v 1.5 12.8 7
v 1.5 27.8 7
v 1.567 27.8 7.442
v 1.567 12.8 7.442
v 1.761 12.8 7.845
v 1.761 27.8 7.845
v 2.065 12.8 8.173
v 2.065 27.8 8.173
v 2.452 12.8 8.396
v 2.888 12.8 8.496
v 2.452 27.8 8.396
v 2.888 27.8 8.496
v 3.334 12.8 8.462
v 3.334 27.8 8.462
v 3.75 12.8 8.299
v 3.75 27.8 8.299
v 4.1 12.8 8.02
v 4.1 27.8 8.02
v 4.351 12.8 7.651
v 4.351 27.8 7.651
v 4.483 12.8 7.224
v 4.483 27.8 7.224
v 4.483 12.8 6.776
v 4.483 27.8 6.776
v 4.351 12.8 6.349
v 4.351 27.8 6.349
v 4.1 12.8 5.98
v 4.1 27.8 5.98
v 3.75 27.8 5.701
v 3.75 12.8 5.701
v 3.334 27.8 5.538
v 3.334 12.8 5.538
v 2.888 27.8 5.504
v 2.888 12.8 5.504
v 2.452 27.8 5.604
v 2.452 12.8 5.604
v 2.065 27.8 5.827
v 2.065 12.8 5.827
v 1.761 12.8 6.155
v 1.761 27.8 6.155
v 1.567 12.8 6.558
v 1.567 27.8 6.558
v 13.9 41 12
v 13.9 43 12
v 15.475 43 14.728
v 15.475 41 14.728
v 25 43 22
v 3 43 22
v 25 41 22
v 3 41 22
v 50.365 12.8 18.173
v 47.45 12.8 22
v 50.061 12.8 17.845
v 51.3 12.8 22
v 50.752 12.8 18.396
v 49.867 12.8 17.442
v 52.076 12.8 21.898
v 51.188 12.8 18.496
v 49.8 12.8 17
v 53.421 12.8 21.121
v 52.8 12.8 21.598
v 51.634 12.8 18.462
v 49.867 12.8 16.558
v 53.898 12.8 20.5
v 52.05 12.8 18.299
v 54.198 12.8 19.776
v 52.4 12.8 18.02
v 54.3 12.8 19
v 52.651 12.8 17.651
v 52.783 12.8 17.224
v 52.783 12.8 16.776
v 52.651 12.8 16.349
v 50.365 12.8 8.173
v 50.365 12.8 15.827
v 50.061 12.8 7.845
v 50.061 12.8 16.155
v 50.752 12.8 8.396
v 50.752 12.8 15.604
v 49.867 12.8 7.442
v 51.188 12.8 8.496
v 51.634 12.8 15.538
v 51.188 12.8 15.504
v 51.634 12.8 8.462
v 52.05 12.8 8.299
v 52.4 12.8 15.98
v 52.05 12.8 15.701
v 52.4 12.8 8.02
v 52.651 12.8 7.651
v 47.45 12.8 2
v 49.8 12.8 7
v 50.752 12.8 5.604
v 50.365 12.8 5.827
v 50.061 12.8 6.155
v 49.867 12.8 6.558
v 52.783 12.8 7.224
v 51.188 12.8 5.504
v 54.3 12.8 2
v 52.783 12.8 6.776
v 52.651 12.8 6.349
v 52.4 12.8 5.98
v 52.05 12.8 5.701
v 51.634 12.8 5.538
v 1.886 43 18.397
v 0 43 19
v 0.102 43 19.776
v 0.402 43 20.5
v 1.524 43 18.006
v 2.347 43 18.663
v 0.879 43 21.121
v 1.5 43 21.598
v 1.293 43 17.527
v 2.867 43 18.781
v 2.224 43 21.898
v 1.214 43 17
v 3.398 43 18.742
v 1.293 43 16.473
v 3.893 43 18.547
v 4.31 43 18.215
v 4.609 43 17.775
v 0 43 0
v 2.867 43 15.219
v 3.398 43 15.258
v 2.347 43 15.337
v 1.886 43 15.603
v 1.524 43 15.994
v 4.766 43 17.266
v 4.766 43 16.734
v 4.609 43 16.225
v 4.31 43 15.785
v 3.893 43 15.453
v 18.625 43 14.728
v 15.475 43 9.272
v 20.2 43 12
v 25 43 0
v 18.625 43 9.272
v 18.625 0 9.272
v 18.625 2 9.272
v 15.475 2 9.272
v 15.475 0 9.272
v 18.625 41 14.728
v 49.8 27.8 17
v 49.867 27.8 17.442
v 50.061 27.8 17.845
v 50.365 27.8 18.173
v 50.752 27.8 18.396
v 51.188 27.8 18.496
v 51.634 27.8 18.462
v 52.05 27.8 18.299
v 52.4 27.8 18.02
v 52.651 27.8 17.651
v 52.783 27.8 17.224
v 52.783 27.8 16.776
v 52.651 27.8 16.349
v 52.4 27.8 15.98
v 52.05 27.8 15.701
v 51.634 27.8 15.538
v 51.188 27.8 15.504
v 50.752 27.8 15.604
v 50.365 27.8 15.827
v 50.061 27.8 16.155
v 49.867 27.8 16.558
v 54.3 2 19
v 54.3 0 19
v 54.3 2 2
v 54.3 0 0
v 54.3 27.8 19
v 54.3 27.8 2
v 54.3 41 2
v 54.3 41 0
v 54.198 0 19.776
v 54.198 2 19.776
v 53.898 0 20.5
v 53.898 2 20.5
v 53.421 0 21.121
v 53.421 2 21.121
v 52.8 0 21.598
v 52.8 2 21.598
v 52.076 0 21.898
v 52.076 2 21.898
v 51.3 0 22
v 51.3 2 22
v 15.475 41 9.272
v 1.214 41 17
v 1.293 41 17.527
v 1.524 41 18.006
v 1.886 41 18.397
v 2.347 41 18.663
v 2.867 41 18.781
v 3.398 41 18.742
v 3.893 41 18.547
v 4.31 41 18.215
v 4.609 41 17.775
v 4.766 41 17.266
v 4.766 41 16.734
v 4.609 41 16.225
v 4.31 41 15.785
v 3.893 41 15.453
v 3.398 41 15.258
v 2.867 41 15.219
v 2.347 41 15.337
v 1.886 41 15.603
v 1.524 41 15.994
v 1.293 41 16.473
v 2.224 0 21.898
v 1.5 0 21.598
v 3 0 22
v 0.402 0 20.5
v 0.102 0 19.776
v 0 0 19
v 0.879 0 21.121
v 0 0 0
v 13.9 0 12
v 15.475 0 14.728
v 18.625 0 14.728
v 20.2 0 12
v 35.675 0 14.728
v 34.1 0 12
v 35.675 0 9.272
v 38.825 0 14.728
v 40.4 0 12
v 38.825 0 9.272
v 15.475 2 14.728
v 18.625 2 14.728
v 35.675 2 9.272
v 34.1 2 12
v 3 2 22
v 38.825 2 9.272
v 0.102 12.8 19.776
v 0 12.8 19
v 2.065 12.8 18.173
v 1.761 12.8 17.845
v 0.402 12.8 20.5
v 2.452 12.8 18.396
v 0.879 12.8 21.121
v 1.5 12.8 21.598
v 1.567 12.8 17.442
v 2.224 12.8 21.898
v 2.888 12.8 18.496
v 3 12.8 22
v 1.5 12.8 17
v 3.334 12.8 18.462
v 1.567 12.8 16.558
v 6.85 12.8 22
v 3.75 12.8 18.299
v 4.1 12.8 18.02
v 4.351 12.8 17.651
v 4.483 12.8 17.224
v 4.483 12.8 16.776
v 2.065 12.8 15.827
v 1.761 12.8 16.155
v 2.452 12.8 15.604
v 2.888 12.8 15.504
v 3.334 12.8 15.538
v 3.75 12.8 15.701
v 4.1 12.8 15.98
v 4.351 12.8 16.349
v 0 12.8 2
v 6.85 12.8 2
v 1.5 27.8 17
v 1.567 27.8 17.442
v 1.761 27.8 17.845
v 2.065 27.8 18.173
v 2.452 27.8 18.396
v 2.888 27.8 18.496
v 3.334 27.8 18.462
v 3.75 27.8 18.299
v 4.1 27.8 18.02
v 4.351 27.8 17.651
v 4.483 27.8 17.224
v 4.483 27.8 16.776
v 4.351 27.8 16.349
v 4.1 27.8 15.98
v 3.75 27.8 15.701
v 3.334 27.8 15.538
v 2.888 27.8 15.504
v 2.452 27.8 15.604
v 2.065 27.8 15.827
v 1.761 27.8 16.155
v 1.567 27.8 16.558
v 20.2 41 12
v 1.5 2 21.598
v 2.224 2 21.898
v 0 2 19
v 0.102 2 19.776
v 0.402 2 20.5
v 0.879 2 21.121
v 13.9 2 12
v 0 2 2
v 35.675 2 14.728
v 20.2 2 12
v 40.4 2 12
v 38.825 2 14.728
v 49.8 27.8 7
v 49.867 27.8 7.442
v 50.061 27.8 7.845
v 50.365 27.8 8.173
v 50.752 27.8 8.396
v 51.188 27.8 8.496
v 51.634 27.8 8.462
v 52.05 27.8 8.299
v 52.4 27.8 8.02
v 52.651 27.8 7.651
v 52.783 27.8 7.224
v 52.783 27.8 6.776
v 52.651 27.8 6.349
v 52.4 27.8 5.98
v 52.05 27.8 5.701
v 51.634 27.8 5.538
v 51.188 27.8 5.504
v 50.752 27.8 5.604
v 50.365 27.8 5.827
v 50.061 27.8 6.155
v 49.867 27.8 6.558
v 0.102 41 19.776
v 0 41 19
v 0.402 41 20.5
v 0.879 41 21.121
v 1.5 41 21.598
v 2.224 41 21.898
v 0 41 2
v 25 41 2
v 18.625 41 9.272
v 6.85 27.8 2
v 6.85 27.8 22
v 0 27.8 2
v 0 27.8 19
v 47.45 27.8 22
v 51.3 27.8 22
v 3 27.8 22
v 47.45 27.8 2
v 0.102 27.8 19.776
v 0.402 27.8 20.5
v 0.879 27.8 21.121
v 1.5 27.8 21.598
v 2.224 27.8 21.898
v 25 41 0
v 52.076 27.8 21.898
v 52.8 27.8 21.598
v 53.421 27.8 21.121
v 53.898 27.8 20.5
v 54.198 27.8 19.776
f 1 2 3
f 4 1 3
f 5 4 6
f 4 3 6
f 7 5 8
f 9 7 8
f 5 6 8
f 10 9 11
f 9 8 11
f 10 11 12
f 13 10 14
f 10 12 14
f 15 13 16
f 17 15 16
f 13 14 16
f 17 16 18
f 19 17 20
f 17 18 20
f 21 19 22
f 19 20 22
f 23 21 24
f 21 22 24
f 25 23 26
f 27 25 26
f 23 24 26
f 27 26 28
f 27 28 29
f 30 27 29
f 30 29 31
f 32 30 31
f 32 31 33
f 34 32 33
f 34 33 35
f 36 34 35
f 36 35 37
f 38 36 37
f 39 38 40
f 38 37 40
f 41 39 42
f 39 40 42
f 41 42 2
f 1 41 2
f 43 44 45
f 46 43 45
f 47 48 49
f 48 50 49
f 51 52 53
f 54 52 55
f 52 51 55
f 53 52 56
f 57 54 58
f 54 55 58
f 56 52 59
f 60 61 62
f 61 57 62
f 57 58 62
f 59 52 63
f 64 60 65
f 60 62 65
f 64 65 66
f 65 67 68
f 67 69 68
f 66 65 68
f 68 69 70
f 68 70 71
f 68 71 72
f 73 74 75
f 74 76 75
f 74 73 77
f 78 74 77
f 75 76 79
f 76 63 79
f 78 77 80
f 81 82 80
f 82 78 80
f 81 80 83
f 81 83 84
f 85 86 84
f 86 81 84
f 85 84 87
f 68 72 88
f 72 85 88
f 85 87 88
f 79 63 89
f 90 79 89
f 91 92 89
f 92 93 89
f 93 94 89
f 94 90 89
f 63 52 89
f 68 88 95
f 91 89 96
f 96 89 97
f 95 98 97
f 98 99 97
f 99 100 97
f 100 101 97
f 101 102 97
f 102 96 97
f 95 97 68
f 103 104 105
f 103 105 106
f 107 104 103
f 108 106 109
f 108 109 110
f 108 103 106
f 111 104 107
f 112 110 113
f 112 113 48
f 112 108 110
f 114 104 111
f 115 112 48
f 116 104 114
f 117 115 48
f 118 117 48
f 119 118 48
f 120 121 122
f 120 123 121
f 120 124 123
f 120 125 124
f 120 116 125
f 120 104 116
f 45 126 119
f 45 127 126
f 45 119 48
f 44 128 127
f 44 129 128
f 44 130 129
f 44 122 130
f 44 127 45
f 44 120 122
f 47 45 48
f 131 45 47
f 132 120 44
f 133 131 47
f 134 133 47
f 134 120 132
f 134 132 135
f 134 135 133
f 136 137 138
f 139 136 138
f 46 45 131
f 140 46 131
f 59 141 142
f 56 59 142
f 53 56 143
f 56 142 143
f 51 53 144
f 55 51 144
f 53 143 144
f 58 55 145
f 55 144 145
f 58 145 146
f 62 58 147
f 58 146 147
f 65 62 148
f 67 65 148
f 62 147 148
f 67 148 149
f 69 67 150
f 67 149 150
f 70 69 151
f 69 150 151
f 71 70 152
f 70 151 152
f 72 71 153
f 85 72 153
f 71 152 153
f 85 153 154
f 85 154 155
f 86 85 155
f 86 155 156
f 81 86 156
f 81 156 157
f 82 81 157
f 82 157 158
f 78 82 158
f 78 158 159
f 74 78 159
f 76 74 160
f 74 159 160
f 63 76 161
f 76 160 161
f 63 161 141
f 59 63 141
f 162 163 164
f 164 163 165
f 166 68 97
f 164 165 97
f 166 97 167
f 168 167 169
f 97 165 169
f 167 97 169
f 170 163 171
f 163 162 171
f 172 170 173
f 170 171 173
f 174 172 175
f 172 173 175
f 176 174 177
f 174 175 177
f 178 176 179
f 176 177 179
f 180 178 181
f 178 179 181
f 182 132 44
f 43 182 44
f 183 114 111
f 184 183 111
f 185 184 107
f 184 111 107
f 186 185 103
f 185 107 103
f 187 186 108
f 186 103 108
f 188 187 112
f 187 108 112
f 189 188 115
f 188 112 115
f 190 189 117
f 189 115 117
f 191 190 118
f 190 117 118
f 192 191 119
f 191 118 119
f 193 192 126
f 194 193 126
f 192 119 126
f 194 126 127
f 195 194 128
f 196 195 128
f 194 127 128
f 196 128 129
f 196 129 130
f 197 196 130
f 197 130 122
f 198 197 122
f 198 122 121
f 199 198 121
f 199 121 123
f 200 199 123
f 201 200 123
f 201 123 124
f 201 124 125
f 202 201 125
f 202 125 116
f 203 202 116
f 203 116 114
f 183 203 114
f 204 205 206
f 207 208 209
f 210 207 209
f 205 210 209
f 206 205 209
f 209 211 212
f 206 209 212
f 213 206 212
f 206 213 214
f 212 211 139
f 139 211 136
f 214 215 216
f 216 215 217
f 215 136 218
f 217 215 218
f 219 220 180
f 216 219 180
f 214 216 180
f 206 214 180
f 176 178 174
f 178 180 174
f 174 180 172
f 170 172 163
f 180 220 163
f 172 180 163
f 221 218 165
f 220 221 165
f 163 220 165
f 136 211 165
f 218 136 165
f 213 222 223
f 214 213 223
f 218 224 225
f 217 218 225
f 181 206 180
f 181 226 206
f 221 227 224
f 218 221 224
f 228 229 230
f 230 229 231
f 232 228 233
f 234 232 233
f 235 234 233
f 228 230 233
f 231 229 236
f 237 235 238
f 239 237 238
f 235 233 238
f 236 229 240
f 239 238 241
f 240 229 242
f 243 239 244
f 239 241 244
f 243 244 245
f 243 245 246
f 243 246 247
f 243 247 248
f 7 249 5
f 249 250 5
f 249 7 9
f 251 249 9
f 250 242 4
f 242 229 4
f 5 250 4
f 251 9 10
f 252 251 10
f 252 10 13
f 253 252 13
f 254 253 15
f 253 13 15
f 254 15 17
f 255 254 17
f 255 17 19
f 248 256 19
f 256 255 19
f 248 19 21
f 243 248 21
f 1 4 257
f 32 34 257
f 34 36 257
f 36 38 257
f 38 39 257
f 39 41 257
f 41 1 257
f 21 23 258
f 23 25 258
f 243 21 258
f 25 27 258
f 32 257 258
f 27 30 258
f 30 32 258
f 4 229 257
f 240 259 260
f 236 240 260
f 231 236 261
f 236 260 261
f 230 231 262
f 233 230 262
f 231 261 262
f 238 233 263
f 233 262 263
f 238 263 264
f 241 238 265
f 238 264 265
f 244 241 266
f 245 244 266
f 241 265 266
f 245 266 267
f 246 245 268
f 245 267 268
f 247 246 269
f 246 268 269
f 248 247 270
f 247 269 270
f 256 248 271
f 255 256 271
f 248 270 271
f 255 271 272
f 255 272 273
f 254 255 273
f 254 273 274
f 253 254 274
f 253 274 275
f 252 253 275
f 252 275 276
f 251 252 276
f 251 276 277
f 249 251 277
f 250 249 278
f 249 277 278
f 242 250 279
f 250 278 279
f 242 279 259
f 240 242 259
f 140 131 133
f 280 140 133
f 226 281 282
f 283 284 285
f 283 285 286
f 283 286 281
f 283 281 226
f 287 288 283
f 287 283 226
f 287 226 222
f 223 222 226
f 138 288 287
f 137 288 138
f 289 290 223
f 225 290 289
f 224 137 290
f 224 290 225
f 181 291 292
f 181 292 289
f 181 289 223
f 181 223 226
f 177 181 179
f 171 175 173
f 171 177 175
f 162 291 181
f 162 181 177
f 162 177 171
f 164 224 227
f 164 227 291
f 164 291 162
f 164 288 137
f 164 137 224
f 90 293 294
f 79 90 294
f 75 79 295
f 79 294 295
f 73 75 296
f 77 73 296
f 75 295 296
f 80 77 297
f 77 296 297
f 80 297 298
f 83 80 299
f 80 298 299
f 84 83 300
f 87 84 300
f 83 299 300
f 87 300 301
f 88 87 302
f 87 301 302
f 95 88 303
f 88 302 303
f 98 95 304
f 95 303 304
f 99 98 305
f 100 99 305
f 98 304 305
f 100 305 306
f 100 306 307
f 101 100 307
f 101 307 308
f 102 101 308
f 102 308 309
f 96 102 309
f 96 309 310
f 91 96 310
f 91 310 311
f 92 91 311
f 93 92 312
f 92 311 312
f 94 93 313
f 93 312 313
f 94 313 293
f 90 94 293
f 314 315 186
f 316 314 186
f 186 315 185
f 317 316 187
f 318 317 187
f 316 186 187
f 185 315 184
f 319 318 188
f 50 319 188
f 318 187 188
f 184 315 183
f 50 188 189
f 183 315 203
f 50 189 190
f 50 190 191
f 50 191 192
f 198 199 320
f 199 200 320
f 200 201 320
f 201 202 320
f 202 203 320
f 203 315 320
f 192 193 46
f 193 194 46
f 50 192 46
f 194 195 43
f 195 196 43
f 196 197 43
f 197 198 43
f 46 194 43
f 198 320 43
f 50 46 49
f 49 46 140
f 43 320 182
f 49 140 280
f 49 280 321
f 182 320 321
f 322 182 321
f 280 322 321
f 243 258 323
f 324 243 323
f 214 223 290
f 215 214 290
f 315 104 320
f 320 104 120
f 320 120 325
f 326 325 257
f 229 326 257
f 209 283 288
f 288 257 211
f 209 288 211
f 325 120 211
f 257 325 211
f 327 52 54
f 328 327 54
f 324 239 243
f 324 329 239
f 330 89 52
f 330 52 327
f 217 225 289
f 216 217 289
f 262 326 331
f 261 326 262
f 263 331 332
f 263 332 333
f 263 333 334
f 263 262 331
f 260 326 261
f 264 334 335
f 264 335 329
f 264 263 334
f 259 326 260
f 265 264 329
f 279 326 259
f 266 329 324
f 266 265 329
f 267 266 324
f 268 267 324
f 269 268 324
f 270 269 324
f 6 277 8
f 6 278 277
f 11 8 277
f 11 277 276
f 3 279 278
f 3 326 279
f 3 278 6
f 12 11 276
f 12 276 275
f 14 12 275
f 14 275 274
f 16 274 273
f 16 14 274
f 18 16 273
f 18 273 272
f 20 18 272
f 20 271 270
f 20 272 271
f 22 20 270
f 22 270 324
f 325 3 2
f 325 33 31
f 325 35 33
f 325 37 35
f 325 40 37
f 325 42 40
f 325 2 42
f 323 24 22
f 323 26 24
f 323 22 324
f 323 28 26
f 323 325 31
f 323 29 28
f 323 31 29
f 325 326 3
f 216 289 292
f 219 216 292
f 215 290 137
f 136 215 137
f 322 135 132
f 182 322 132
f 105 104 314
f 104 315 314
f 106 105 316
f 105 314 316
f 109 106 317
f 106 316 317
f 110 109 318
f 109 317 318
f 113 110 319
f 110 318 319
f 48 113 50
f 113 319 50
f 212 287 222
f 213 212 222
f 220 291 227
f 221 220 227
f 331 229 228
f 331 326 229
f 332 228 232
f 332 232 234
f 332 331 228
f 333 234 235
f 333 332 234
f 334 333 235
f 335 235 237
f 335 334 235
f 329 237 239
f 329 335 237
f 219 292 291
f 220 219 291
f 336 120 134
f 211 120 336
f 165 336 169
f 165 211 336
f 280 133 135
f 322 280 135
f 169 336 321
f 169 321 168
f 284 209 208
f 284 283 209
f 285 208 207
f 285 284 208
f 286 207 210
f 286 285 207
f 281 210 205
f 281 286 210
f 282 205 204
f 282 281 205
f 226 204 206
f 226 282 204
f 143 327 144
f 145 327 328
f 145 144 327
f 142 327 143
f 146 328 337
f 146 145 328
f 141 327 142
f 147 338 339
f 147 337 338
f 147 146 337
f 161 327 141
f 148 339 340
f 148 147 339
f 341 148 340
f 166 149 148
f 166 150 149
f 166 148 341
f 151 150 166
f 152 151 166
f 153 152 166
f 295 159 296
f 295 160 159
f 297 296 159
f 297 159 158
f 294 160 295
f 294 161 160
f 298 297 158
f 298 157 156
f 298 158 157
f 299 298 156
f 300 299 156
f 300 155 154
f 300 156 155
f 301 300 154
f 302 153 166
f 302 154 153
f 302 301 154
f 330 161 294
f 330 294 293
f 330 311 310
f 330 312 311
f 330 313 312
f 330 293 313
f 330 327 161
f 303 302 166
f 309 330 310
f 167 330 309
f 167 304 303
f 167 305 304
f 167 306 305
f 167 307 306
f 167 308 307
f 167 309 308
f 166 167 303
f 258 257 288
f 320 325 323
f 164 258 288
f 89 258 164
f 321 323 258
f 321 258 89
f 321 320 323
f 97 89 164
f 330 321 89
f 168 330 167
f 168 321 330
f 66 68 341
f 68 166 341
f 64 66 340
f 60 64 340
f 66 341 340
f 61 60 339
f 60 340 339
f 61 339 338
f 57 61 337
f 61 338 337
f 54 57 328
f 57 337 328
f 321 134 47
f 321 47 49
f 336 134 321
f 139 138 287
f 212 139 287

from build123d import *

# Parameters (mm, degrees)
SKETCH_W        = 54.3
SKETCH_H        = 39
PAD_DEPTH       = 2
SKETCH001_W     = 54.3
SKETCH001_H     = 2
PAD001_DEPTH    = 22
SKETCH003_W     = 6.85
SKETCH003_H     = 15
PAD003_DEPTH    = 22
SKETCH004_R     = 1.5
POCKET_DEPTH    = 15
SKETCH005_W     = 6.85
SKETCH005_H     = 15
PAD004_DEPTH    = 22
SKETCH006_R     = 1.5
POCKET001_DEPTH = 15
SKETCH007_W     = 25
SKETCH007_H     = 2
PAD005_DEPTH    = 22
POCKET002_DEPTH = 2.5
POCKET003_DEPTH = 5
FILLET_R        = 3
FILLET001_R     = 3
FILLET002_R     = 3
FILLET003_R     = 3
FILLET004_R     = 3
SKETCH010_R     = 1.786385
POCKET004_DEPTH = 5


with BuildPart() as part:
    # Sketch → Pad (new body)
    with BuildSketch(Plane.XY):
        with Locations((27.15, 21.5)):
            Rectangle(SKETCH_W, SKETCH_H)
    extrude(amount=PAD_DEPTH)

    # Sketch001 → Pad001 (join)
    with BuildSketch(Plane.XY):
        with Locations((27.15, 1)):
            Rectangle(SKETCH001_W, SKETCH001_H)
    extrude(amount=PAD001_DEPTH)

    # Sketch003 → Pad003 (join)
    with BuildSketch(Plane.XY):
        with Locations((3.425, 20.3)):
            Rectangle(SKETCH003_W, SKETCH003_H)
    extrude(amount=PAD003_DEPTH)

    # Sketch004 (on Face14 of Pad003) → Pocket (cut)
    with BuildSketch(Plane(origin=(0, 27.8, 0), x_dir=(-1, 0, 0), z_dir=(0, 1, 0))):
        with Locations((-3, 17)):
            Circle(SKETCH004_R)
        with Locations((-3, 7)):
            Circle(SKETCH004_R)
    extrude(amount=-POCKET_DEPTH, mode=Mode.SUBTRACT)

    # Sketch005 → Pad004 (join)
    with BuildSketch(Plane.XY):
        with Locations((50.875, 20.3)):
            Rectangle(SKETCH005_W, SKETCH005_H)
    extrude(amount=PAD004_DEPTH)

    # Sketch006 (on Face13 of Pad004) → Pocket001 (cut)
    with BuildSketch(Plane(origin=(0, 27.8, 0), x_dir=(-1, 0, 0), z_dir=(0, 1, 0))):
        with Locations((-51.3, 17)):
            Circle(SKETCH006_R)
        with Locations((-51.3, 7)):
            Circle(SKETCH006_R)
    extrude(amount=-POCKET001_DEPTH, mode=Mode.SUBTRACT)

    # Sketch007 (on Face4 of Pocket001) → Pad005 (join)
    with BuildSketch(Plane(origin=(0, 0, 0), x_dir=(1, 0, 0), z_dir=(0, 0, -1))):
        with Locations((12.5, -42)):
            Rectangle(SKETCH007_W, SKETCH007_H)
    extrude(amount=-PAD005_DEPTH)

    # Sketch008 (on Face18 of Pad005) → Pocket002 (cut)
    with BuildSketch(Plane(origin=(0, 2, 0), x_dir=(-1, 0, 0), z_dir=(0, 1, 0))):
        Polygon((-34.1, 12), (-35.675, 14.72798), (-38.825, 14.72798), (-40.4, 12), (-38.825, 9.27202), (-35.675, 9.27202), align=None)
        Polygon((-15.475, 14.72798), (-18.625, 14.72798), (-20.2, 12), (-18.625, 9.27202), (-15.475, 9.27202), (-13.9, 12), align=None)
    extrude(amount=-POCKET002_DEPTH, mode=Mode.SUBTRACT)

    # Sketch009 (on Face22 of Pocket002) → Pocket003 (cut)
    with BuildSketch(Plane(origin=(0, 43, 0), x_dir=(-1, 0, 0), z_dir=(0, 1, 0))):
        Polygon((-13.9, 12), (-15.475, 14.72798), (-18.625, 14.72798), (-20.2, 12), (-18.625, 9.27202), (-15.475, 9.27202), align=None)
    extrude(amount=-POCKET003_DEPTH, mode=Mode.SUBTRACT)

    # Fillet
    fillet_edges = [part.edges().sort_by_distance(p)[0] for p in [
        (0, 42, 22),
    ]]
    fillet(fillet_edges, radius=FILLET_R)

    # Fillet001
    fillet001_edges = [part.edges().sort_by_distance(p)[0] for p in [
        (0, 1, 22),
    ]]
    fillet(fillet001_edges, radius=FILLET001_R)

    # Fillet002
    fillet002_edges = [part.edges().sort_by_distance(p)[0] for p in [
        (0, 20.3, 22),
    ]]
    fillet(fillet002_edges, radius=FILLET002_R)

    # Fillet003
    fillet003_edges = [part.edges().sort_by_distance(p)[0] for p in [
        (54.3, 1, 22),
    ]]
    fillet(fillet003_edges, radius=FILLET003_R)

    # Fillet004
    fillet004_edges = [part.edges().sort_by_distance(p)[0] for p in [
        (54.3, 20.3, 22),
    ]]
    fillet(fillet004_edges, radius=FILLET004_R)

    # Sketch010 (on Face56 of Fillet004) → Pocket004 (cut)
    with BuildSketch(Plane(origin=(0, 43, 0), x_dir=(-1, 0, 0), z_dir=(0, 1, 0))):
        with Locations((-3, 17)):
            Circle(SKETCH010_R)
    extrude(amount=-POCKET004_DEPTH, mode=Mode.SUBTRACT)


solid = part.part
